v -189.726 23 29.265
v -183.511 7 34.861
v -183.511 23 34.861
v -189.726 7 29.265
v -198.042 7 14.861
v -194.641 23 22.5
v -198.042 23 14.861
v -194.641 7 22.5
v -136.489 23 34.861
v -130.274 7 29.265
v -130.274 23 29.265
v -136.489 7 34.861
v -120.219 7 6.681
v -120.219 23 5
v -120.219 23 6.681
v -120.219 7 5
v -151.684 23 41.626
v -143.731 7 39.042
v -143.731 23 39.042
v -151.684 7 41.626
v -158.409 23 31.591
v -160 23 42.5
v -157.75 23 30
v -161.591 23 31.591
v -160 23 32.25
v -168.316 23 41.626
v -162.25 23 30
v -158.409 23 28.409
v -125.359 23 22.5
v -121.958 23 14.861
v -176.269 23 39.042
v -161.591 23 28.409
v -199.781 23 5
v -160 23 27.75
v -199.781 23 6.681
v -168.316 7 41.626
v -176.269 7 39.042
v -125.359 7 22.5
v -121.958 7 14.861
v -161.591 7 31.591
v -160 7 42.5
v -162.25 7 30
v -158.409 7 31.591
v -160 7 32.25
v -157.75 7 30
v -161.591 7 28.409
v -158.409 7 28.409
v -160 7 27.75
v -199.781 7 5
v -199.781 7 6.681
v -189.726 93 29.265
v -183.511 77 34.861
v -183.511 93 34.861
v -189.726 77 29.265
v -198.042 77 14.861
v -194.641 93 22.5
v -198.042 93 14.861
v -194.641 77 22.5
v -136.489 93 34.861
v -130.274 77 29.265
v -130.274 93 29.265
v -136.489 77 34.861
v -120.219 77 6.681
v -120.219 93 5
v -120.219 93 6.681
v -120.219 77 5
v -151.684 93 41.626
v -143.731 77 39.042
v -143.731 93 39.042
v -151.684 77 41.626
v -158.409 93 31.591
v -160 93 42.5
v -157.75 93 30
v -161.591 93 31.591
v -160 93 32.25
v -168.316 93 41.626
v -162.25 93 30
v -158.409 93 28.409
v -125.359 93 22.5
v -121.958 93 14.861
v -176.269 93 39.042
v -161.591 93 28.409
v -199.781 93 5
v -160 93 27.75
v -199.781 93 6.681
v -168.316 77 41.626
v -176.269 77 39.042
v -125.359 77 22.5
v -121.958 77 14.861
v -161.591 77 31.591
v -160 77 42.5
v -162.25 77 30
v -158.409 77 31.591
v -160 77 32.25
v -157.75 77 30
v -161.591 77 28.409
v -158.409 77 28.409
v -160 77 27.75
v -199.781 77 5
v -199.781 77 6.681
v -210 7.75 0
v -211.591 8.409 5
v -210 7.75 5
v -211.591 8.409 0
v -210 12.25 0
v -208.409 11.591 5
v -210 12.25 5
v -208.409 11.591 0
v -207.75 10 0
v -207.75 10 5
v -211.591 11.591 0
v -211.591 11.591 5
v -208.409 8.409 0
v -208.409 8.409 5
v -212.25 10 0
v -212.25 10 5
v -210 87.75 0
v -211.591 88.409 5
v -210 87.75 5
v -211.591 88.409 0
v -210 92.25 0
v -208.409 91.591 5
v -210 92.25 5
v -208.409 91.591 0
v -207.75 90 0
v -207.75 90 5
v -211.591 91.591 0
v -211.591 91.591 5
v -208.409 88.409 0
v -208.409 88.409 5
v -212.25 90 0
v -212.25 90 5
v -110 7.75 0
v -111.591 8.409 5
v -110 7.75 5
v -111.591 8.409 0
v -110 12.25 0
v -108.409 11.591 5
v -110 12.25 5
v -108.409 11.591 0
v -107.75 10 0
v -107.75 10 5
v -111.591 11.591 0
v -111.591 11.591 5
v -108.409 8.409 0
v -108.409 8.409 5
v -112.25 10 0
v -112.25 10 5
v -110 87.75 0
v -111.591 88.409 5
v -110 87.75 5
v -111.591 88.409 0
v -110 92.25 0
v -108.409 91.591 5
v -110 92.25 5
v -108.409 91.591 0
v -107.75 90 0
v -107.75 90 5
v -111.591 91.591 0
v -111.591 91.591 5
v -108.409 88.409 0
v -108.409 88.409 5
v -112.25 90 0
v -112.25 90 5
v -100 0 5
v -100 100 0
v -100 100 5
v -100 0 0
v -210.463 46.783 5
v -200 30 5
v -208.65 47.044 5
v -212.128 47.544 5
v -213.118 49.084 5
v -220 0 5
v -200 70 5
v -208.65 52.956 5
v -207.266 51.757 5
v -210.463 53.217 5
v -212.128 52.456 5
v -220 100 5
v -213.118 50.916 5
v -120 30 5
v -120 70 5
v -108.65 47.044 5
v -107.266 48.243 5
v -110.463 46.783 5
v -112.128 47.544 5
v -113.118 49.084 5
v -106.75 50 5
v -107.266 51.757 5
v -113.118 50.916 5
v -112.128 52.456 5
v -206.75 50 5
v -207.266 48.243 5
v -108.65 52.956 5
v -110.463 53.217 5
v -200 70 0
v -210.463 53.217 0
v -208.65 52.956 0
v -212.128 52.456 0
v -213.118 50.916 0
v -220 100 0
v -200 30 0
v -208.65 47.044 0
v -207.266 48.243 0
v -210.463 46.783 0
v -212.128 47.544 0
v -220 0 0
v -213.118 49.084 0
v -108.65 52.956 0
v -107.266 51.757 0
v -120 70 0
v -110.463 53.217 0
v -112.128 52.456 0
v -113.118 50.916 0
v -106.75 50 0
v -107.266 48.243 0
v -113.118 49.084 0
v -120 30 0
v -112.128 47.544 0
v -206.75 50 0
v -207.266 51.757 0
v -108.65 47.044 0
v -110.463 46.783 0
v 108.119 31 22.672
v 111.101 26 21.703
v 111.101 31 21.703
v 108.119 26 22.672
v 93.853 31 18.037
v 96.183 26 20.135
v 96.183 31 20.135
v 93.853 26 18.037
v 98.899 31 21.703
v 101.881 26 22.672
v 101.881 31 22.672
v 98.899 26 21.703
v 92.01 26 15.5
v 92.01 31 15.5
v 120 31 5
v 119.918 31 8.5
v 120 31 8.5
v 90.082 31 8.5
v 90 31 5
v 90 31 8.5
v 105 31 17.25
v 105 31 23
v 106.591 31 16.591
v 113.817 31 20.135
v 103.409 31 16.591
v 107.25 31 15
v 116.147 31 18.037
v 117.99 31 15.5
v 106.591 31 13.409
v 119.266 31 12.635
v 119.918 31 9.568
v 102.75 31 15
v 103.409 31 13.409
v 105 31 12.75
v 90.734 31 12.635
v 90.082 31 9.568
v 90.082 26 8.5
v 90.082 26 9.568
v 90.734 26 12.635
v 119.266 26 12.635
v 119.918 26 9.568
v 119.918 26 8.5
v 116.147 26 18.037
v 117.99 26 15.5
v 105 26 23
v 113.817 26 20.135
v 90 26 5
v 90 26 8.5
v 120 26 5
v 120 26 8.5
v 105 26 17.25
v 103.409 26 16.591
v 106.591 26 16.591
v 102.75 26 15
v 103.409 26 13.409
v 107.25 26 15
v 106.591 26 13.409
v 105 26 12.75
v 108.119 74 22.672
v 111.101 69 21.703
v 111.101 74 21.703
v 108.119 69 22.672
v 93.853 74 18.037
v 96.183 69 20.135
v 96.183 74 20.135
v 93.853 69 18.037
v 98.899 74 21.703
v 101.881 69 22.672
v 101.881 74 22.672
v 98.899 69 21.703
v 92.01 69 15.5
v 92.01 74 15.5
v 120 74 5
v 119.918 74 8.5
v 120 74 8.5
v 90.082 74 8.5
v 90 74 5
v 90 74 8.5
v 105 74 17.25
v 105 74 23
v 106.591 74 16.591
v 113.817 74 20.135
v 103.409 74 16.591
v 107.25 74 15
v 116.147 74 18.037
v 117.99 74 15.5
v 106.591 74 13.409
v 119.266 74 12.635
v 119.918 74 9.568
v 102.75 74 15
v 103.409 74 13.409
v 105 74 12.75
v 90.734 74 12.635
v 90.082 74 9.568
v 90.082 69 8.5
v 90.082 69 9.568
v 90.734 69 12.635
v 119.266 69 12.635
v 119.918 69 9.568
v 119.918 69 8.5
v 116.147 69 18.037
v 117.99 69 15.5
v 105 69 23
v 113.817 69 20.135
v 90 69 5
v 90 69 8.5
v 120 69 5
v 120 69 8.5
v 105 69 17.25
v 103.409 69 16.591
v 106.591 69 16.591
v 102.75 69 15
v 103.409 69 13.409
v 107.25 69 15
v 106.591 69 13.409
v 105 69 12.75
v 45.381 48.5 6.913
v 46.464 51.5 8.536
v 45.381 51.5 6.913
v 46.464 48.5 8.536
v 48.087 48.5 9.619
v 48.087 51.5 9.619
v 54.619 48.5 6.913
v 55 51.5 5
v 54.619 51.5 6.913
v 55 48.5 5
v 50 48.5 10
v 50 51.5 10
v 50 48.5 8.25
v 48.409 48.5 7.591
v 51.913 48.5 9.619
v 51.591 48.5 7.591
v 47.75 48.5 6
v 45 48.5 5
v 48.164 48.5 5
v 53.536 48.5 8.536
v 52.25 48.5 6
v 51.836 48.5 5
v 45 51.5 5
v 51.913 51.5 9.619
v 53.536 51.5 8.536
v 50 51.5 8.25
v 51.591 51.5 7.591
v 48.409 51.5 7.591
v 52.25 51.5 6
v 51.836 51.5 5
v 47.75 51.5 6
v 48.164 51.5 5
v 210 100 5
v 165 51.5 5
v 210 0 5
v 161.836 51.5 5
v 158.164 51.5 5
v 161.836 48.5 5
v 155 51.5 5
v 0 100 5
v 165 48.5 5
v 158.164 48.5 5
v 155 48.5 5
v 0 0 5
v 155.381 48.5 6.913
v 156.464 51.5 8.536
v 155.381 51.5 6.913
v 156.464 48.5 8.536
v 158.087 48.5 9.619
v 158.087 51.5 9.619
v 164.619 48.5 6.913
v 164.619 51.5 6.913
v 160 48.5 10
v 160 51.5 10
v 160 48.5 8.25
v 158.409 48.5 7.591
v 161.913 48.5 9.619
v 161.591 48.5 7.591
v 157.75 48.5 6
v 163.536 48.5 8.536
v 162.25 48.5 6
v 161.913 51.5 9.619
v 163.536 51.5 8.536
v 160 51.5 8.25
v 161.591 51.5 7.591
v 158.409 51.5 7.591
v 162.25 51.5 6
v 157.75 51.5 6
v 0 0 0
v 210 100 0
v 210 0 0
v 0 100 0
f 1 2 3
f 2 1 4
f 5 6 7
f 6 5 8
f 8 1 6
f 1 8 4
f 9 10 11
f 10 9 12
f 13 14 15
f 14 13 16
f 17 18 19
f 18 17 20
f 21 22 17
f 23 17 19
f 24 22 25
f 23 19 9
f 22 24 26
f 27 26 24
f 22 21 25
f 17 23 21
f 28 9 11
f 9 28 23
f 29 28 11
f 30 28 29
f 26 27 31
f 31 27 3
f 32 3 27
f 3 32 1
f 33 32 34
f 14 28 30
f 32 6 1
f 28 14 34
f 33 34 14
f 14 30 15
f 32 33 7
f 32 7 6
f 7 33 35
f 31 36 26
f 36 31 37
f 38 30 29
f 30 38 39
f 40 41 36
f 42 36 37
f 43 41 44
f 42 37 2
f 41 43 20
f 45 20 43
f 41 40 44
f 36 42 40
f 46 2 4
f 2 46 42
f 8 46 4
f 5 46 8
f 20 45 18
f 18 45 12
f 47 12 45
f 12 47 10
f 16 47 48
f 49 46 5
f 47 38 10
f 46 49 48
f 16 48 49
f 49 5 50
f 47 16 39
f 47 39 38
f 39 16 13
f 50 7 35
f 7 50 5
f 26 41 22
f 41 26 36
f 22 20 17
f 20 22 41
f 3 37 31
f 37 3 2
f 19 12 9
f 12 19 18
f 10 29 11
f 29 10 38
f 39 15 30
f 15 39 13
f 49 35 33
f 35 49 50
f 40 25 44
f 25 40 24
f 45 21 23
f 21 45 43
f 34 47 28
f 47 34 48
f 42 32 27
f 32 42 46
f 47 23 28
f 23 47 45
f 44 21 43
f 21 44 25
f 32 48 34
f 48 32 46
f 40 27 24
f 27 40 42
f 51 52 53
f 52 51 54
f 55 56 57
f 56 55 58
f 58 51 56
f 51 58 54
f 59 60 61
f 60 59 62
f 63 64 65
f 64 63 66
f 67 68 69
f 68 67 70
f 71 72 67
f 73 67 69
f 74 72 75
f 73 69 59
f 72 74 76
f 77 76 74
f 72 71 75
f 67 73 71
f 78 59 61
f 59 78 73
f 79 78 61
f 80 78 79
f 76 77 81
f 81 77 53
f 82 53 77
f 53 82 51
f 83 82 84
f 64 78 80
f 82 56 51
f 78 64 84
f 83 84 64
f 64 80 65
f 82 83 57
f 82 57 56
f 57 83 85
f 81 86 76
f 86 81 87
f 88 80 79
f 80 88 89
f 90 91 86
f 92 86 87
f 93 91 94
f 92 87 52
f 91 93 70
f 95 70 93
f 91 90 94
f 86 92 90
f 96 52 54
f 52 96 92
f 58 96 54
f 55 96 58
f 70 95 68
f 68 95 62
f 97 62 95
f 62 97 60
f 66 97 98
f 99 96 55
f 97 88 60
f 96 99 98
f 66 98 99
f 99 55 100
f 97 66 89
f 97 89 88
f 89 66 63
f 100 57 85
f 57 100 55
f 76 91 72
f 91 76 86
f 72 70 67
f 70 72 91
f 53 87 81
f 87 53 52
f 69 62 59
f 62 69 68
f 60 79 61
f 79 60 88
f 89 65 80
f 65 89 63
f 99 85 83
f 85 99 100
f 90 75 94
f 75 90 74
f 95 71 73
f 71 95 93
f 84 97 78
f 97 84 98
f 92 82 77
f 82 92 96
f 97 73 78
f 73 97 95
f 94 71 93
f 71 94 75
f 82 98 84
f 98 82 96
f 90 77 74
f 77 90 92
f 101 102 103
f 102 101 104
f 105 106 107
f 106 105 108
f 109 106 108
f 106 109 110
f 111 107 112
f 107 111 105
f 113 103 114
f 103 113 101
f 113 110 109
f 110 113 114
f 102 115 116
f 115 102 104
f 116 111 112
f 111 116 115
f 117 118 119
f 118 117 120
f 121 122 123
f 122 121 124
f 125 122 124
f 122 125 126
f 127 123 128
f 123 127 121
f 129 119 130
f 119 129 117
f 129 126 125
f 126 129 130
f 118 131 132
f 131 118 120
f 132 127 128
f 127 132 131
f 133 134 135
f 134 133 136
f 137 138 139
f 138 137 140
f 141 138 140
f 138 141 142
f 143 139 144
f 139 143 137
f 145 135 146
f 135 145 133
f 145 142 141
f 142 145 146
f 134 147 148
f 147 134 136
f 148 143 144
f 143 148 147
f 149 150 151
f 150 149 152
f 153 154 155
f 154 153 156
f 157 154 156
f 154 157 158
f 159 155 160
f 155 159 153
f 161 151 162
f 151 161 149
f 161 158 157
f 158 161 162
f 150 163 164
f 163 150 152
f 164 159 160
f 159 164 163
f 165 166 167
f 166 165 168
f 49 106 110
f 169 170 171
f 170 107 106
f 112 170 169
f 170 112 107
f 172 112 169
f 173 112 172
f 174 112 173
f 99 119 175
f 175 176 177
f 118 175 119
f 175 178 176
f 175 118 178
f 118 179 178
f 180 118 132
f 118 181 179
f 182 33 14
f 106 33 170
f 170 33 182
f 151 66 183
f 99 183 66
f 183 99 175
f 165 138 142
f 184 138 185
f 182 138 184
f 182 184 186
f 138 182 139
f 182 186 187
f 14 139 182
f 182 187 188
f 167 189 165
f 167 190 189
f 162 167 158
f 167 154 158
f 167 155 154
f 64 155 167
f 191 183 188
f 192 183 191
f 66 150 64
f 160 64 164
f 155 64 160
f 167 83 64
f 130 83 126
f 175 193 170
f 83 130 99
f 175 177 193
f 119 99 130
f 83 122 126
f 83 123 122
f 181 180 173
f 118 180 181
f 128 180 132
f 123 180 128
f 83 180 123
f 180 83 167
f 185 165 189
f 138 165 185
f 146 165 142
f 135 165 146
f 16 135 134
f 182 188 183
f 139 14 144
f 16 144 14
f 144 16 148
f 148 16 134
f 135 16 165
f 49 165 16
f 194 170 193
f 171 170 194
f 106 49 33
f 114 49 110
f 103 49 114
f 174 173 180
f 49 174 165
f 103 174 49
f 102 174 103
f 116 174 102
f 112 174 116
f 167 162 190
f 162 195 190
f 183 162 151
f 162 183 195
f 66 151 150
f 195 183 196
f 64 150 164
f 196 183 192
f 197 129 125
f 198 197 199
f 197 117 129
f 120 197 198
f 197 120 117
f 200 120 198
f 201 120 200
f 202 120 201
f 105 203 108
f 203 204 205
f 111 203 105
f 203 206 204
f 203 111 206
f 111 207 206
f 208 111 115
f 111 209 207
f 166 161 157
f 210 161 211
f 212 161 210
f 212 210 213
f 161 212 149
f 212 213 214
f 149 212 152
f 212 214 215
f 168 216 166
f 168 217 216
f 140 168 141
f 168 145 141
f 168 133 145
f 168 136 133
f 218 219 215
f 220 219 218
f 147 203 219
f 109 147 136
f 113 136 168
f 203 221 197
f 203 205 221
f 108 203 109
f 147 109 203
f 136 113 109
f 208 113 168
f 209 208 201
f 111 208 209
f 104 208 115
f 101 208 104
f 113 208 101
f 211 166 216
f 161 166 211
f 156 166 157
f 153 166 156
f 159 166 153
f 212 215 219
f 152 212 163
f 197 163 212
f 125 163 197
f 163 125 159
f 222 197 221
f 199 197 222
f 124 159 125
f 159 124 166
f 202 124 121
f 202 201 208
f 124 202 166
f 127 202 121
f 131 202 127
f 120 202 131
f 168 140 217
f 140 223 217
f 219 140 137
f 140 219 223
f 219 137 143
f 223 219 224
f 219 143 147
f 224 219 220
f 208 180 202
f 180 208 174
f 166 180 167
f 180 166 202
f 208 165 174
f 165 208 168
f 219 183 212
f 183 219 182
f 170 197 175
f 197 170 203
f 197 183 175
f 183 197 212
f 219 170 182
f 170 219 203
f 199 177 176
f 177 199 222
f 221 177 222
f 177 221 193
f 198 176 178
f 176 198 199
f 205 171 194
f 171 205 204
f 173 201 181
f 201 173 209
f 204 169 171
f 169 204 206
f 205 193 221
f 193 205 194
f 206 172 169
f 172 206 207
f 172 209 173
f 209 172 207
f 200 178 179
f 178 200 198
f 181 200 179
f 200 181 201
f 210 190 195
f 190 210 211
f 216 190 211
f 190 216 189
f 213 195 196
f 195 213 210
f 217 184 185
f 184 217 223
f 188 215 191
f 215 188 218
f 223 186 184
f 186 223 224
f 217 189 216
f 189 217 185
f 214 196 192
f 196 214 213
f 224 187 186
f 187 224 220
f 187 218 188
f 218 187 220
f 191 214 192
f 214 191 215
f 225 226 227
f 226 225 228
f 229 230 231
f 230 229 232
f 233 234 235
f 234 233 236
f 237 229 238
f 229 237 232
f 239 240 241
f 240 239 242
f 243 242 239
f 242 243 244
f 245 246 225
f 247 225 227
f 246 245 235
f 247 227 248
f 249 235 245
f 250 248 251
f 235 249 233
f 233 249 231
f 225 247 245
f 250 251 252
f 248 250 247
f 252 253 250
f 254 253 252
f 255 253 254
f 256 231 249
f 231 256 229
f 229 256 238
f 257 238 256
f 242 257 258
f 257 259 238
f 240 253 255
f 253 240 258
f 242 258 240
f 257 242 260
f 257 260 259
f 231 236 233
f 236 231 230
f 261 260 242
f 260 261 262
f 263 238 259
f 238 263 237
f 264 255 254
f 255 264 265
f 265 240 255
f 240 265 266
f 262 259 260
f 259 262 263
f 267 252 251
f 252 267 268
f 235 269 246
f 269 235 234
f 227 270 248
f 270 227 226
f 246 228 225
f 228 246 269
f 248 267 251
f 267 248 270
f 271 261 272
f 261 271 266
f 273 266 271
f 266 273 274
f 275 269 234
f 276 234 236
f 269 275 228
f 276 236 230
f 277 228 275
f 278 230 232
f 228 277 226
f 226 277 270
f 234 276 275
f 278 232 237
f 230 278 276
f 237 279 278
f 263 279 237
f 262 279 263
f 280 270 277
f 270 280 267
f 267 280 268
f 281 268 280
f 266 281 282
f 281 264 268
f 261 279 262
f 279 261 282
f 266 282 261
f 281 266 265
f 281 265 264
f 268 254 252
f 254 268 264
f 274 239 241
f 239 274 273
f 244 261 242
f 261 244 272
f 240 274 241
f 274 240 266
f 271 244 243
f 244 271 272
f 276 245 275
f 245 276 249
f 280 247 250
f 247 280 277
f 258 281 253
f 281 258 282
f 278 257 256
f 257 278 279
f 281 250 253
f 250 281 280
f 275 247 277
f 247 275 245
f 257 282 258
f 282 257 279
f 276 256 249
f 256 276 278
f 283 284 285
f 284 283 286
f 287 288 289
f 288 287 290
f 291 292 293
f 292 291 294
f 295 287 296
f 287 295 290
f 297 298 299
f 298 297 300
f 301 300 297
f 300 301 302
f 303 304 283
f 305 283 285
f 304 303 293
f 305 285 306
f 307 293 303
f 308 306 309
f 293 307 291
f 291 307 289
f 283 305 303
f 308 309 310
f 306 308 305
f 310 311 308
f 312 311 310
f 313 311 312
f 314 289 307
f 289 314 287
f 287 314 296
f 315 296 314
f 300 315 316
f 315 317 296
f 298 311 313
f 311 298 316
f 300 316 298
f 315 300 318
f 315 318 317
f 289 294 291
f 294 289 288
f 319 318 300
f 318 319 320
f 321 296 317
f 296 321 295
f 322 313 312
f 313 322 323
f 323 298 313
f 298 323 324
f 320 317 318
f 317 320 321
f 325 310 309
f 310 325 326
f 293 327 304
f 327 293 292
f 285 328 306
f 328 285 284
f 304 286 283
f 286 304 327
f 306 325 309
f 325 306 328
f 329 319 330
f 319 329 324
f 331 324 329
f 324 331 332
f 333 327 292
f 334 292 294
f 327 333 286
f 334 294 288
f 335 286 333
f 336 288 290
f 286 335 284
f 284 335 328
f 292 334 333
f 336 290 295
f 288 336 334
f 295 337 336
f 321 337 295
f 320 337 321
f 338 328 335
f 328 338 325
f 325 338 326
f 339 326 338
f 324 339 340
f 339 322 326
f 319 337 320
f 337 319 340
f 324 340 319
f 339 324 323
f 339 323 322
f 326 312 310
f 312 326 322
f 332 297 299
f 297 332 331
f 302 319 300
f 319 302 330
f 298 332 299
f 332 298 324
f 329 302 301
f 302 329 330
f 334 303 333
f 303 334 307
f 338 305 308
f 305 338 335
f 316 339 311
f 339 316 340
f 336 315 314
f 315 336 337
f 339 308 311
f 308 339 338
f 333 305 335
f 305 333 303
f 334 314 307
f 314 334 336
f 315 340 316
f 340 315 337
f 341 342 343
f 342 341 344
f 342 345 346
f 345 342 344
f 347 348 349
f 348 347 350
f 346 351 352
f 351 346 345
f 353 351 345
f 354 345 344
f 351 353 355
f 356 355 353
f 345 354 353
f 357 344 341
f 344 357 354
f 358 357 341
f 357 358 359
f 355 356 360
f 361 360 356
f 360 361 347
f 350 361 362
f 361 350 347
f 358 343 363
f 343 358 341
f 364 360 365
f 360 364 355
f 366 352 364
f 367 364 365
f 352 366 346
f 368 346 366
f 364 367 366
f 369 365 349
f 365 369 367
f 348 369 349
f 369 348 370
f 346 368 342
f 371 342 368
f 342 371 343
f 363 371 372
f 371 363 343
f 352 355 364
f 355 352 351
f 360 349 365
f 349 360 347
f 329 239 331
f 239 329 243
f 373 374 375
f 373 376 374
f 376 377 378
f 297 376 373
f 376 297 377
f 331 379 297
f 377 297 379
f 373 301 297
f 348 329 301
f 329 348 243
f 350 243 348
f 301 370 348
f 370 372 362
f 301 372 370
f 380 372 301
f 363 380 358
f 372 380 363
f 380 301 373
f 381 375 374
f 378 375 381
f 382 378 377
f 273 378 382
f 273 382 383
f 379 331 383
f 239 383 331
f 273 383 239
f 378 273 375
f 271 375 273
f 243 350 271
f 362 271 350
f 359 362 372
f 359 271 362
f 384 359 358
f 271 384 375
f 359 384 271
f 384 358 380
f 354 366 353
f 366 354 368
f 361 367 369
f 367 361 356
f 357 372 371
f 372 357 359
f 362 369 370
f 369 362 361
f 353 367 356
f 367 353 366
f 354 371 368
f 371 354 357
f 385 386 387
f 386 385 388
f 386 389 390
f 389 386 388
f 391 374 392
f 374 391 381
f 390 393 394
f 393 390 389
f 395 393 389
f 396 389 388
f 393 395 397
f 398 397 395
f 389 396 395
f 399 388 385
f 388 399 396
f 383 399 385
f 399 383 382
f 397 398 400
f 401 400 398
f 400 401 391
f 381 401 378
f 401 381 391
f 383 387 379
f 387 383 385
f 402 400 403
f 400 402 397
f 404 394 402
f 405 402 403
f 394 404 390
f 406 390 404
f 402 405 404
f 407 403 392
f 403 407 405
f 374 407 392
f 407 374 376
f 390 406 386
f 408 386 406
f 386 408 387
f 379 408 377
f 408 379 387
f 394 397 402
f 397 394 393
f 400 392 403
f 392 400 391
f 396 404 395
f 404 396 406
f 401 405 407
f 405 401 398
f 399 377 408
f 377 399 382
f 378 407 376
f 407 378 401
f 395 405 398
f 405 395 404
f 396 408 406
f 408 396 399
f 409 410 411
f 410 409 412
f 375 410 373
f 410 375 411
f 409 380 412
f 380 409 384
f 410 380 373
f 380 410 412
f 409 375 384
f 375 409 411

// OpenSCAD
// prototype pedal 
plate_width1 = 120;
plate_length1 = 100;
plate_height1 = 5;

platehole_width1 = 80;
platehole_length1 = 40;
platehole_height1 = 17;

plate_dimensions1 = [plate_width1,plate_length1,plate_height1];
hole_dimensions1 = [platehole_width1, platehole_length1, platehole_height1];

drillhole_gap1 = 10;
drillhole_diameter1 = 4.5;
drillhole_spring_diameter1 = 6.5;
edge_gap1 = drillhole_gap1 + drillhole_diameter1 / 2; 

drillholedistance_x1 = plate_dimensions1.x - 2*drillhole_gap1;
drillholedistance_y1 = plate_dimensions1.y - 2*drillhole_gap1;
drillhole_x1 = [drillhole_gap1 : drillholedistance_x1 : plate_dimensions1.x - drillhole_gap1];
drillhole_y1 = [drillhole_gap1 : drillholedistance_y1 : plate_dimensions1.y - drillhole_gap1];

angle_placement1 = ((plate_length1/2)-(platehole_length1/2))/2;

//https://www.reddit.com/r/openscad/comments/loask5/half_sphere_cropping_how_do_i_cut_things/
module halfcylinder(he,rd) {
difference(){
cylinder (h=he,r=rd);
translate ([0,-rd-0.1,-0.1]) cube([rd+0.1,rd*2+0.2,he+0.2]);
} // df
}

// mod
cylinder_radius1 = plate_width1 / 3;
cylinder_height1 = 16;

translate([-220,0,0])
union(){
//projection(){
	difference(){
	translate([plate_width1/2, angle_placement1+8, (plate_height1/2)])
	rotate([90,90,0])
	halfcylinder(cylinder_height1,cylinder_radius1);

	translate([plate_width1/2,angle_placement1+10,cylinder_radius1-10])
		rotate([90,90,0])
		//color("black")
		cylinder(d = drillhole_diameter1, h=cylinder_height1 + 8);
	}

	difference(){
	translate([plate_width1/2, plate_length1-angle_placement1+8,(plate_height1/2)])
	rotate([90,90,0])
	halfcylinder(cylinder_height1,cylinder_radius1);
	translate([plate_width1/2, plate_length1-angle_placement1+10,cylinder_radius1-10])
		rotate([90,90,0])
		//color("yellow")
		cylinder(d = drillhole_diameter1, h=cylinder_height1 + 8);
	}


	difference(){
	   
	   cube(plate_dimensions1);
	   
	   for(x = drillhole_x1, y = drillhole_y1)
	   translate([x,y, -1])
	   cylinder(d = drillhole_diameter1, h = plate_dimensions1.z +2);
	   
	   
		translate([
			(plate_width1 - platehole_width1)/2,
		(plate_length1 - platehole_length1)/2,
		-1])
	   
		cube(hole_dimensions1);  
	   
	   translate([(plate_width1-platehole_width1)/4,plate_length1/2, -1])
	   
	   //color("black")
		cylinder(d = drillhole_spring_diameter1, h=cylinder_height1 + 8);
	   
	   
	   translate([plate_width1-((plate_width1-platehole_width1)/4),plate_length1/2, -1])
		cylinder(d = drillhole_spring_diameter1, h=cylinder_height1 + 8);
	   
	   /*translate([1,-0,1])
	   rotate([90,0,0])
	   linear_extrude(5)
		text("nici - v1.0", size=2.5);*/

		//}


	}

}



// prototype pedal 
plate_width = 210;
plate_length = 100;
plate_height = 5;

helperplate_width = 30;
helperplate_length = 5;
helperplate_height = 8;

spring_point = 55;


helperhelper_width = 40;
helperhelper_length = 12; 
helperhelper_height = 5;


plate_dimensions = [
	plate_width,
	plate_length,
	plate_height];
	
helperplate_dimensions = [
	helperplate_width,
	helperplate_length,
	helperplate_height];
	
helperhelper_dimensions = [
	helperhelper_width,
	helperhelper_length, 
	helperhelper_height,
];
	
drillhole_gap = 10;
drillhole_diameter = 4.5;
drillhole_spring_diameter = 6.5;
edge_gap = drillhole_gap + drillhole_diameter / 2; 


module lochplatte( groesse, loch_dm, loch_abst, anzahl = [12,6] ) {

	difference() {

		cube( plate_dimensions );

		randabstand   = loch_abst + loch_dm/2;
		x_lochdistanz = (groesse.x - 2*randabstand) / (anzahl.x - 1);
		y_lochdistanz = (groesse.y - 2*randabstand) / (anzahl.y - 1);
		x_werte       = [randabstand : x_lochdistanz : groesse.x - randabstand + 0.1];
		y_werte       = [randabstand : y_lochdistanz : groesse.y - randabstand + 0.1];

	
		// Bohrlöcher
		for (x = x_werte, y = y_werte)
	    translate( [x, y, -1] )
	    //color( "red" )
	    cylinder( d = loch_dm, h = groesse.z + 2);

	}

}

//https://www.reddit.com/r/openscad/comments/loask5/half_sphere_cropping_how_do_i_cut_things/
module halfcylinder(he,rd) {
difference(){
cylinder (h=he,r=rd);
translate ([0,-rd-0.1,-0.1]) cube([rd+0.1,rd*2+0.2,he+0.2]);
} // df
} // mod
cylinder_radius = 15;
cylinder_height = 5;

// use this command to get 2D redering -> deswegen auch alles rotiert
//projection(){
union(){

//linker Bügel
//rotate([90,0,0])
difference(){
    union(){
        translate([
			plate_width/2-helperplate_width/2, 
			plate_length/2-24,
			(cylinder_radius/2)-plate_height-2])
        //color("black")
        cube(helperplate_dimensions);
        
        translate([plate_width/2, plate_length/2-24, 8])
        rotate([270,90,0])
        //color("blue")
        halfcylinder(cylinder_height,cylinder_radius);
    };
	
	translate([plate_width/2, plate_length/2-20, 15])
    rotate([90,90,0])
	//color("black")
    cylinder(d = drillhole_diameter, h=cylinder_height + 5, center = true);
}


//rechte Bügel
//rotate([90,0,0])
difference(){
    union(){
        translate([
			plate_width/2-helperplate_width/2, 
			//plate_length-21-cylinder_height,
			plate_length/2+24-5,
			(cylinder_radius/2)-plate_height-2])
        //color("black")
        cube(helperplate_dimensions);
        
        translate([plate_width/2, plate_length/2+19, 8])
        rotate([270,90,0])
        //color("green")
        halfcylinder(cylinder_height,cylinder_radius);
    };
	
	translate([plate_width/2, plate_length-23-cylinder_height, 15])
    rotate([90,90,0])
	//color("red")
    cylinder(d = drillhole_diameter, h=cylinder_height + 5, center = true);
}

//rotate([90,0,0])
difference(){
		translate([plate_width/2-spring_point, plate_length/2-3/2, plate_height])
		rotate([270,90,0])
		//color("pink")
		halfcylinder(3,5);
		
		translate([plate_width/2-spring_point, plate_length/2, plate_height+1])
		rotate([90,90,0])
		cylinder(d = drillhole_diameter, h=cylinder_height + 5, center = true);		
}

//rotate([90,0,0])
difference(){
		translate([plate_width/2+spring_point, plate_length/2-3/2, plate_height])
		rotate([270,90,0])
		//color("pink")
		halfcylinder(3,5);
		
		translate([plate_width/2+spring_point, plate_length/2, plate_height+1])
		rotate([90,90,0])
		cylinder(d = drillhole_diameter, h=cylinder_height + 5, center = true);		
}



//hier ziehen wir sachen von anderen sachen ab
//rotate([90,0,0])
union(){
   	translate([plate_width/2,plate_length-20-cylinder_height,plate_height/2])
	cube(helperhelper_dimensions, center = true);	
	
	translate([plate_width/2,(plate_length/2-20-cylinder_height),plate_height/2])
	cube(helperhelper_dimensions, center = true);	
	
	//lochplatte(groesse = plate_dimensions, loch_dm= 10, loch_abst = 4 );
	cube(plate_dimensions);
	translate([plate_width-2,0,3.5])
	rotate([90,180,0])
	text("nici - v1.0", size=2.5);
}
//}


}
